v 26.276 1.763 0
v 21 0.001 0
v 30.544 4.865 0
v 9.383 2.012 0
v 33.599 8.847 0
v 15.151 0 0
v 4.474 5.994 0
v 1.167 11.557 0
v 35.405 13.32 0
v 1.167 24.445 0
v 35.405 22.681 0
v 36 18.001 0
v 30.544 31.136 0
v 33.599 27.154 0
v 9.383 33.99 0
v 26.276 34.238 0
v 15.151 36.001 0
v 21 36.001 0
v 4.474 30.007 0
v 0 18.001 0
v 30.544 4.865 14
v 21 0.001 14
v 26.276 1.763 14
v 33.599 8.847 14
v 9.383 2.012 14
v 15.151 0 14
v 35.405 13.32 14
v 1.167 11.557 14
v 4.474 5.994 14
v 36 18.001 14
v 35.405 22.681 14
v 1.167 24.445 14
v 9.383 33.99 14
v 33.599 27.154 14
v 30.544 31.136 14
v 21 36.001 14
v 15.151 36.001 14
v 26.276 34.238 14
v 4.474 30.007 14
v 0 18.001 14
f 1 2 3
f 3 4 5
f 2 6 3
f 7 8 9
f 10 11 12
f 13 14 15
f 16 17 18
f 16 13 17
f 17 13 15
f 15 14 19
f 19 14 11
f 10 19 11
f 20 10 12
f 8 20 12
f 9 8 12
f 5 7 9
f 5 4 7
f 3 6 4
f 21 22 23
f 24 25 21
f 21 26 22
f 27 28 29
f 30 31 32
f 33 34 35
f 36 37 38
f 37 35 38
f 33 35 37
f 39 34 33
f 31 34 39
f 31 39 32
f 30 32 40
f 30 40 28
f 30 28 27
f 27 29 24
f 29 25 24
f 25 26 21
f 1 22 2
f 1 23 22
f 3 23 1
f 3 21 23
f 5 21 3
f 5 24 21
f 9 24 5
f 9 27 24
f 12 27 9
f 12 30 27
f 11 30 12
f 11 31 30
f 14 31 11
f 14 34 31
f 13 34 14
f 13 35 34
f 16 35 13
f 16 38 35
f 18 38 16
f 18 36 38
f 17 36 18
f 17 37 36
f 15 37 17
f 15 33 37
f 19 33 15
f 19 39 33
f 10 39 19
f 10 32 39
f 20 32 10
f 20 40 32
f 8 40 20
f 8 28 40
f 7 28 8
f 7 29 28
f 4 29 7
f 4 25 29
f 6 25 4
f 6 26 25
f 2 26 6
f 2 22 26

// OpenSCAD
$fn = 32;

// ----------------------------------------------------------------------
// Cam disc: base radius 15.0 mm, lift 6.0 mm, 20 profile points
// ----------------------------------------------------------------------

// --- parameters (mm) ---
profile_height = 14;      // extrusion height
profile_points = 20;      // points of the closed outline

profile = [[36, 18.001], [35.405, 22.681], [33.599, 27.154], [30.544, 31.136], [26.276, 34.238], [21, 36.001], [15.151, 36.001], [9.383, 33.99], [4.474, 30.007], [1.167, 24.445], [0, 18.001], [1.167, 11.557], [4.474, 5.994], [9.383, 2.012], [15.151, 0], [21, 0.001], [26.276, 1.763], [30.544, 4.865], [33.599, 8.847], [35.405, 13.32]];  // single closed polygon, 20 points, counter clockwise

// --- the one profile operation ---
linear_extrude(height = profile_height) polygon(points = profile);
